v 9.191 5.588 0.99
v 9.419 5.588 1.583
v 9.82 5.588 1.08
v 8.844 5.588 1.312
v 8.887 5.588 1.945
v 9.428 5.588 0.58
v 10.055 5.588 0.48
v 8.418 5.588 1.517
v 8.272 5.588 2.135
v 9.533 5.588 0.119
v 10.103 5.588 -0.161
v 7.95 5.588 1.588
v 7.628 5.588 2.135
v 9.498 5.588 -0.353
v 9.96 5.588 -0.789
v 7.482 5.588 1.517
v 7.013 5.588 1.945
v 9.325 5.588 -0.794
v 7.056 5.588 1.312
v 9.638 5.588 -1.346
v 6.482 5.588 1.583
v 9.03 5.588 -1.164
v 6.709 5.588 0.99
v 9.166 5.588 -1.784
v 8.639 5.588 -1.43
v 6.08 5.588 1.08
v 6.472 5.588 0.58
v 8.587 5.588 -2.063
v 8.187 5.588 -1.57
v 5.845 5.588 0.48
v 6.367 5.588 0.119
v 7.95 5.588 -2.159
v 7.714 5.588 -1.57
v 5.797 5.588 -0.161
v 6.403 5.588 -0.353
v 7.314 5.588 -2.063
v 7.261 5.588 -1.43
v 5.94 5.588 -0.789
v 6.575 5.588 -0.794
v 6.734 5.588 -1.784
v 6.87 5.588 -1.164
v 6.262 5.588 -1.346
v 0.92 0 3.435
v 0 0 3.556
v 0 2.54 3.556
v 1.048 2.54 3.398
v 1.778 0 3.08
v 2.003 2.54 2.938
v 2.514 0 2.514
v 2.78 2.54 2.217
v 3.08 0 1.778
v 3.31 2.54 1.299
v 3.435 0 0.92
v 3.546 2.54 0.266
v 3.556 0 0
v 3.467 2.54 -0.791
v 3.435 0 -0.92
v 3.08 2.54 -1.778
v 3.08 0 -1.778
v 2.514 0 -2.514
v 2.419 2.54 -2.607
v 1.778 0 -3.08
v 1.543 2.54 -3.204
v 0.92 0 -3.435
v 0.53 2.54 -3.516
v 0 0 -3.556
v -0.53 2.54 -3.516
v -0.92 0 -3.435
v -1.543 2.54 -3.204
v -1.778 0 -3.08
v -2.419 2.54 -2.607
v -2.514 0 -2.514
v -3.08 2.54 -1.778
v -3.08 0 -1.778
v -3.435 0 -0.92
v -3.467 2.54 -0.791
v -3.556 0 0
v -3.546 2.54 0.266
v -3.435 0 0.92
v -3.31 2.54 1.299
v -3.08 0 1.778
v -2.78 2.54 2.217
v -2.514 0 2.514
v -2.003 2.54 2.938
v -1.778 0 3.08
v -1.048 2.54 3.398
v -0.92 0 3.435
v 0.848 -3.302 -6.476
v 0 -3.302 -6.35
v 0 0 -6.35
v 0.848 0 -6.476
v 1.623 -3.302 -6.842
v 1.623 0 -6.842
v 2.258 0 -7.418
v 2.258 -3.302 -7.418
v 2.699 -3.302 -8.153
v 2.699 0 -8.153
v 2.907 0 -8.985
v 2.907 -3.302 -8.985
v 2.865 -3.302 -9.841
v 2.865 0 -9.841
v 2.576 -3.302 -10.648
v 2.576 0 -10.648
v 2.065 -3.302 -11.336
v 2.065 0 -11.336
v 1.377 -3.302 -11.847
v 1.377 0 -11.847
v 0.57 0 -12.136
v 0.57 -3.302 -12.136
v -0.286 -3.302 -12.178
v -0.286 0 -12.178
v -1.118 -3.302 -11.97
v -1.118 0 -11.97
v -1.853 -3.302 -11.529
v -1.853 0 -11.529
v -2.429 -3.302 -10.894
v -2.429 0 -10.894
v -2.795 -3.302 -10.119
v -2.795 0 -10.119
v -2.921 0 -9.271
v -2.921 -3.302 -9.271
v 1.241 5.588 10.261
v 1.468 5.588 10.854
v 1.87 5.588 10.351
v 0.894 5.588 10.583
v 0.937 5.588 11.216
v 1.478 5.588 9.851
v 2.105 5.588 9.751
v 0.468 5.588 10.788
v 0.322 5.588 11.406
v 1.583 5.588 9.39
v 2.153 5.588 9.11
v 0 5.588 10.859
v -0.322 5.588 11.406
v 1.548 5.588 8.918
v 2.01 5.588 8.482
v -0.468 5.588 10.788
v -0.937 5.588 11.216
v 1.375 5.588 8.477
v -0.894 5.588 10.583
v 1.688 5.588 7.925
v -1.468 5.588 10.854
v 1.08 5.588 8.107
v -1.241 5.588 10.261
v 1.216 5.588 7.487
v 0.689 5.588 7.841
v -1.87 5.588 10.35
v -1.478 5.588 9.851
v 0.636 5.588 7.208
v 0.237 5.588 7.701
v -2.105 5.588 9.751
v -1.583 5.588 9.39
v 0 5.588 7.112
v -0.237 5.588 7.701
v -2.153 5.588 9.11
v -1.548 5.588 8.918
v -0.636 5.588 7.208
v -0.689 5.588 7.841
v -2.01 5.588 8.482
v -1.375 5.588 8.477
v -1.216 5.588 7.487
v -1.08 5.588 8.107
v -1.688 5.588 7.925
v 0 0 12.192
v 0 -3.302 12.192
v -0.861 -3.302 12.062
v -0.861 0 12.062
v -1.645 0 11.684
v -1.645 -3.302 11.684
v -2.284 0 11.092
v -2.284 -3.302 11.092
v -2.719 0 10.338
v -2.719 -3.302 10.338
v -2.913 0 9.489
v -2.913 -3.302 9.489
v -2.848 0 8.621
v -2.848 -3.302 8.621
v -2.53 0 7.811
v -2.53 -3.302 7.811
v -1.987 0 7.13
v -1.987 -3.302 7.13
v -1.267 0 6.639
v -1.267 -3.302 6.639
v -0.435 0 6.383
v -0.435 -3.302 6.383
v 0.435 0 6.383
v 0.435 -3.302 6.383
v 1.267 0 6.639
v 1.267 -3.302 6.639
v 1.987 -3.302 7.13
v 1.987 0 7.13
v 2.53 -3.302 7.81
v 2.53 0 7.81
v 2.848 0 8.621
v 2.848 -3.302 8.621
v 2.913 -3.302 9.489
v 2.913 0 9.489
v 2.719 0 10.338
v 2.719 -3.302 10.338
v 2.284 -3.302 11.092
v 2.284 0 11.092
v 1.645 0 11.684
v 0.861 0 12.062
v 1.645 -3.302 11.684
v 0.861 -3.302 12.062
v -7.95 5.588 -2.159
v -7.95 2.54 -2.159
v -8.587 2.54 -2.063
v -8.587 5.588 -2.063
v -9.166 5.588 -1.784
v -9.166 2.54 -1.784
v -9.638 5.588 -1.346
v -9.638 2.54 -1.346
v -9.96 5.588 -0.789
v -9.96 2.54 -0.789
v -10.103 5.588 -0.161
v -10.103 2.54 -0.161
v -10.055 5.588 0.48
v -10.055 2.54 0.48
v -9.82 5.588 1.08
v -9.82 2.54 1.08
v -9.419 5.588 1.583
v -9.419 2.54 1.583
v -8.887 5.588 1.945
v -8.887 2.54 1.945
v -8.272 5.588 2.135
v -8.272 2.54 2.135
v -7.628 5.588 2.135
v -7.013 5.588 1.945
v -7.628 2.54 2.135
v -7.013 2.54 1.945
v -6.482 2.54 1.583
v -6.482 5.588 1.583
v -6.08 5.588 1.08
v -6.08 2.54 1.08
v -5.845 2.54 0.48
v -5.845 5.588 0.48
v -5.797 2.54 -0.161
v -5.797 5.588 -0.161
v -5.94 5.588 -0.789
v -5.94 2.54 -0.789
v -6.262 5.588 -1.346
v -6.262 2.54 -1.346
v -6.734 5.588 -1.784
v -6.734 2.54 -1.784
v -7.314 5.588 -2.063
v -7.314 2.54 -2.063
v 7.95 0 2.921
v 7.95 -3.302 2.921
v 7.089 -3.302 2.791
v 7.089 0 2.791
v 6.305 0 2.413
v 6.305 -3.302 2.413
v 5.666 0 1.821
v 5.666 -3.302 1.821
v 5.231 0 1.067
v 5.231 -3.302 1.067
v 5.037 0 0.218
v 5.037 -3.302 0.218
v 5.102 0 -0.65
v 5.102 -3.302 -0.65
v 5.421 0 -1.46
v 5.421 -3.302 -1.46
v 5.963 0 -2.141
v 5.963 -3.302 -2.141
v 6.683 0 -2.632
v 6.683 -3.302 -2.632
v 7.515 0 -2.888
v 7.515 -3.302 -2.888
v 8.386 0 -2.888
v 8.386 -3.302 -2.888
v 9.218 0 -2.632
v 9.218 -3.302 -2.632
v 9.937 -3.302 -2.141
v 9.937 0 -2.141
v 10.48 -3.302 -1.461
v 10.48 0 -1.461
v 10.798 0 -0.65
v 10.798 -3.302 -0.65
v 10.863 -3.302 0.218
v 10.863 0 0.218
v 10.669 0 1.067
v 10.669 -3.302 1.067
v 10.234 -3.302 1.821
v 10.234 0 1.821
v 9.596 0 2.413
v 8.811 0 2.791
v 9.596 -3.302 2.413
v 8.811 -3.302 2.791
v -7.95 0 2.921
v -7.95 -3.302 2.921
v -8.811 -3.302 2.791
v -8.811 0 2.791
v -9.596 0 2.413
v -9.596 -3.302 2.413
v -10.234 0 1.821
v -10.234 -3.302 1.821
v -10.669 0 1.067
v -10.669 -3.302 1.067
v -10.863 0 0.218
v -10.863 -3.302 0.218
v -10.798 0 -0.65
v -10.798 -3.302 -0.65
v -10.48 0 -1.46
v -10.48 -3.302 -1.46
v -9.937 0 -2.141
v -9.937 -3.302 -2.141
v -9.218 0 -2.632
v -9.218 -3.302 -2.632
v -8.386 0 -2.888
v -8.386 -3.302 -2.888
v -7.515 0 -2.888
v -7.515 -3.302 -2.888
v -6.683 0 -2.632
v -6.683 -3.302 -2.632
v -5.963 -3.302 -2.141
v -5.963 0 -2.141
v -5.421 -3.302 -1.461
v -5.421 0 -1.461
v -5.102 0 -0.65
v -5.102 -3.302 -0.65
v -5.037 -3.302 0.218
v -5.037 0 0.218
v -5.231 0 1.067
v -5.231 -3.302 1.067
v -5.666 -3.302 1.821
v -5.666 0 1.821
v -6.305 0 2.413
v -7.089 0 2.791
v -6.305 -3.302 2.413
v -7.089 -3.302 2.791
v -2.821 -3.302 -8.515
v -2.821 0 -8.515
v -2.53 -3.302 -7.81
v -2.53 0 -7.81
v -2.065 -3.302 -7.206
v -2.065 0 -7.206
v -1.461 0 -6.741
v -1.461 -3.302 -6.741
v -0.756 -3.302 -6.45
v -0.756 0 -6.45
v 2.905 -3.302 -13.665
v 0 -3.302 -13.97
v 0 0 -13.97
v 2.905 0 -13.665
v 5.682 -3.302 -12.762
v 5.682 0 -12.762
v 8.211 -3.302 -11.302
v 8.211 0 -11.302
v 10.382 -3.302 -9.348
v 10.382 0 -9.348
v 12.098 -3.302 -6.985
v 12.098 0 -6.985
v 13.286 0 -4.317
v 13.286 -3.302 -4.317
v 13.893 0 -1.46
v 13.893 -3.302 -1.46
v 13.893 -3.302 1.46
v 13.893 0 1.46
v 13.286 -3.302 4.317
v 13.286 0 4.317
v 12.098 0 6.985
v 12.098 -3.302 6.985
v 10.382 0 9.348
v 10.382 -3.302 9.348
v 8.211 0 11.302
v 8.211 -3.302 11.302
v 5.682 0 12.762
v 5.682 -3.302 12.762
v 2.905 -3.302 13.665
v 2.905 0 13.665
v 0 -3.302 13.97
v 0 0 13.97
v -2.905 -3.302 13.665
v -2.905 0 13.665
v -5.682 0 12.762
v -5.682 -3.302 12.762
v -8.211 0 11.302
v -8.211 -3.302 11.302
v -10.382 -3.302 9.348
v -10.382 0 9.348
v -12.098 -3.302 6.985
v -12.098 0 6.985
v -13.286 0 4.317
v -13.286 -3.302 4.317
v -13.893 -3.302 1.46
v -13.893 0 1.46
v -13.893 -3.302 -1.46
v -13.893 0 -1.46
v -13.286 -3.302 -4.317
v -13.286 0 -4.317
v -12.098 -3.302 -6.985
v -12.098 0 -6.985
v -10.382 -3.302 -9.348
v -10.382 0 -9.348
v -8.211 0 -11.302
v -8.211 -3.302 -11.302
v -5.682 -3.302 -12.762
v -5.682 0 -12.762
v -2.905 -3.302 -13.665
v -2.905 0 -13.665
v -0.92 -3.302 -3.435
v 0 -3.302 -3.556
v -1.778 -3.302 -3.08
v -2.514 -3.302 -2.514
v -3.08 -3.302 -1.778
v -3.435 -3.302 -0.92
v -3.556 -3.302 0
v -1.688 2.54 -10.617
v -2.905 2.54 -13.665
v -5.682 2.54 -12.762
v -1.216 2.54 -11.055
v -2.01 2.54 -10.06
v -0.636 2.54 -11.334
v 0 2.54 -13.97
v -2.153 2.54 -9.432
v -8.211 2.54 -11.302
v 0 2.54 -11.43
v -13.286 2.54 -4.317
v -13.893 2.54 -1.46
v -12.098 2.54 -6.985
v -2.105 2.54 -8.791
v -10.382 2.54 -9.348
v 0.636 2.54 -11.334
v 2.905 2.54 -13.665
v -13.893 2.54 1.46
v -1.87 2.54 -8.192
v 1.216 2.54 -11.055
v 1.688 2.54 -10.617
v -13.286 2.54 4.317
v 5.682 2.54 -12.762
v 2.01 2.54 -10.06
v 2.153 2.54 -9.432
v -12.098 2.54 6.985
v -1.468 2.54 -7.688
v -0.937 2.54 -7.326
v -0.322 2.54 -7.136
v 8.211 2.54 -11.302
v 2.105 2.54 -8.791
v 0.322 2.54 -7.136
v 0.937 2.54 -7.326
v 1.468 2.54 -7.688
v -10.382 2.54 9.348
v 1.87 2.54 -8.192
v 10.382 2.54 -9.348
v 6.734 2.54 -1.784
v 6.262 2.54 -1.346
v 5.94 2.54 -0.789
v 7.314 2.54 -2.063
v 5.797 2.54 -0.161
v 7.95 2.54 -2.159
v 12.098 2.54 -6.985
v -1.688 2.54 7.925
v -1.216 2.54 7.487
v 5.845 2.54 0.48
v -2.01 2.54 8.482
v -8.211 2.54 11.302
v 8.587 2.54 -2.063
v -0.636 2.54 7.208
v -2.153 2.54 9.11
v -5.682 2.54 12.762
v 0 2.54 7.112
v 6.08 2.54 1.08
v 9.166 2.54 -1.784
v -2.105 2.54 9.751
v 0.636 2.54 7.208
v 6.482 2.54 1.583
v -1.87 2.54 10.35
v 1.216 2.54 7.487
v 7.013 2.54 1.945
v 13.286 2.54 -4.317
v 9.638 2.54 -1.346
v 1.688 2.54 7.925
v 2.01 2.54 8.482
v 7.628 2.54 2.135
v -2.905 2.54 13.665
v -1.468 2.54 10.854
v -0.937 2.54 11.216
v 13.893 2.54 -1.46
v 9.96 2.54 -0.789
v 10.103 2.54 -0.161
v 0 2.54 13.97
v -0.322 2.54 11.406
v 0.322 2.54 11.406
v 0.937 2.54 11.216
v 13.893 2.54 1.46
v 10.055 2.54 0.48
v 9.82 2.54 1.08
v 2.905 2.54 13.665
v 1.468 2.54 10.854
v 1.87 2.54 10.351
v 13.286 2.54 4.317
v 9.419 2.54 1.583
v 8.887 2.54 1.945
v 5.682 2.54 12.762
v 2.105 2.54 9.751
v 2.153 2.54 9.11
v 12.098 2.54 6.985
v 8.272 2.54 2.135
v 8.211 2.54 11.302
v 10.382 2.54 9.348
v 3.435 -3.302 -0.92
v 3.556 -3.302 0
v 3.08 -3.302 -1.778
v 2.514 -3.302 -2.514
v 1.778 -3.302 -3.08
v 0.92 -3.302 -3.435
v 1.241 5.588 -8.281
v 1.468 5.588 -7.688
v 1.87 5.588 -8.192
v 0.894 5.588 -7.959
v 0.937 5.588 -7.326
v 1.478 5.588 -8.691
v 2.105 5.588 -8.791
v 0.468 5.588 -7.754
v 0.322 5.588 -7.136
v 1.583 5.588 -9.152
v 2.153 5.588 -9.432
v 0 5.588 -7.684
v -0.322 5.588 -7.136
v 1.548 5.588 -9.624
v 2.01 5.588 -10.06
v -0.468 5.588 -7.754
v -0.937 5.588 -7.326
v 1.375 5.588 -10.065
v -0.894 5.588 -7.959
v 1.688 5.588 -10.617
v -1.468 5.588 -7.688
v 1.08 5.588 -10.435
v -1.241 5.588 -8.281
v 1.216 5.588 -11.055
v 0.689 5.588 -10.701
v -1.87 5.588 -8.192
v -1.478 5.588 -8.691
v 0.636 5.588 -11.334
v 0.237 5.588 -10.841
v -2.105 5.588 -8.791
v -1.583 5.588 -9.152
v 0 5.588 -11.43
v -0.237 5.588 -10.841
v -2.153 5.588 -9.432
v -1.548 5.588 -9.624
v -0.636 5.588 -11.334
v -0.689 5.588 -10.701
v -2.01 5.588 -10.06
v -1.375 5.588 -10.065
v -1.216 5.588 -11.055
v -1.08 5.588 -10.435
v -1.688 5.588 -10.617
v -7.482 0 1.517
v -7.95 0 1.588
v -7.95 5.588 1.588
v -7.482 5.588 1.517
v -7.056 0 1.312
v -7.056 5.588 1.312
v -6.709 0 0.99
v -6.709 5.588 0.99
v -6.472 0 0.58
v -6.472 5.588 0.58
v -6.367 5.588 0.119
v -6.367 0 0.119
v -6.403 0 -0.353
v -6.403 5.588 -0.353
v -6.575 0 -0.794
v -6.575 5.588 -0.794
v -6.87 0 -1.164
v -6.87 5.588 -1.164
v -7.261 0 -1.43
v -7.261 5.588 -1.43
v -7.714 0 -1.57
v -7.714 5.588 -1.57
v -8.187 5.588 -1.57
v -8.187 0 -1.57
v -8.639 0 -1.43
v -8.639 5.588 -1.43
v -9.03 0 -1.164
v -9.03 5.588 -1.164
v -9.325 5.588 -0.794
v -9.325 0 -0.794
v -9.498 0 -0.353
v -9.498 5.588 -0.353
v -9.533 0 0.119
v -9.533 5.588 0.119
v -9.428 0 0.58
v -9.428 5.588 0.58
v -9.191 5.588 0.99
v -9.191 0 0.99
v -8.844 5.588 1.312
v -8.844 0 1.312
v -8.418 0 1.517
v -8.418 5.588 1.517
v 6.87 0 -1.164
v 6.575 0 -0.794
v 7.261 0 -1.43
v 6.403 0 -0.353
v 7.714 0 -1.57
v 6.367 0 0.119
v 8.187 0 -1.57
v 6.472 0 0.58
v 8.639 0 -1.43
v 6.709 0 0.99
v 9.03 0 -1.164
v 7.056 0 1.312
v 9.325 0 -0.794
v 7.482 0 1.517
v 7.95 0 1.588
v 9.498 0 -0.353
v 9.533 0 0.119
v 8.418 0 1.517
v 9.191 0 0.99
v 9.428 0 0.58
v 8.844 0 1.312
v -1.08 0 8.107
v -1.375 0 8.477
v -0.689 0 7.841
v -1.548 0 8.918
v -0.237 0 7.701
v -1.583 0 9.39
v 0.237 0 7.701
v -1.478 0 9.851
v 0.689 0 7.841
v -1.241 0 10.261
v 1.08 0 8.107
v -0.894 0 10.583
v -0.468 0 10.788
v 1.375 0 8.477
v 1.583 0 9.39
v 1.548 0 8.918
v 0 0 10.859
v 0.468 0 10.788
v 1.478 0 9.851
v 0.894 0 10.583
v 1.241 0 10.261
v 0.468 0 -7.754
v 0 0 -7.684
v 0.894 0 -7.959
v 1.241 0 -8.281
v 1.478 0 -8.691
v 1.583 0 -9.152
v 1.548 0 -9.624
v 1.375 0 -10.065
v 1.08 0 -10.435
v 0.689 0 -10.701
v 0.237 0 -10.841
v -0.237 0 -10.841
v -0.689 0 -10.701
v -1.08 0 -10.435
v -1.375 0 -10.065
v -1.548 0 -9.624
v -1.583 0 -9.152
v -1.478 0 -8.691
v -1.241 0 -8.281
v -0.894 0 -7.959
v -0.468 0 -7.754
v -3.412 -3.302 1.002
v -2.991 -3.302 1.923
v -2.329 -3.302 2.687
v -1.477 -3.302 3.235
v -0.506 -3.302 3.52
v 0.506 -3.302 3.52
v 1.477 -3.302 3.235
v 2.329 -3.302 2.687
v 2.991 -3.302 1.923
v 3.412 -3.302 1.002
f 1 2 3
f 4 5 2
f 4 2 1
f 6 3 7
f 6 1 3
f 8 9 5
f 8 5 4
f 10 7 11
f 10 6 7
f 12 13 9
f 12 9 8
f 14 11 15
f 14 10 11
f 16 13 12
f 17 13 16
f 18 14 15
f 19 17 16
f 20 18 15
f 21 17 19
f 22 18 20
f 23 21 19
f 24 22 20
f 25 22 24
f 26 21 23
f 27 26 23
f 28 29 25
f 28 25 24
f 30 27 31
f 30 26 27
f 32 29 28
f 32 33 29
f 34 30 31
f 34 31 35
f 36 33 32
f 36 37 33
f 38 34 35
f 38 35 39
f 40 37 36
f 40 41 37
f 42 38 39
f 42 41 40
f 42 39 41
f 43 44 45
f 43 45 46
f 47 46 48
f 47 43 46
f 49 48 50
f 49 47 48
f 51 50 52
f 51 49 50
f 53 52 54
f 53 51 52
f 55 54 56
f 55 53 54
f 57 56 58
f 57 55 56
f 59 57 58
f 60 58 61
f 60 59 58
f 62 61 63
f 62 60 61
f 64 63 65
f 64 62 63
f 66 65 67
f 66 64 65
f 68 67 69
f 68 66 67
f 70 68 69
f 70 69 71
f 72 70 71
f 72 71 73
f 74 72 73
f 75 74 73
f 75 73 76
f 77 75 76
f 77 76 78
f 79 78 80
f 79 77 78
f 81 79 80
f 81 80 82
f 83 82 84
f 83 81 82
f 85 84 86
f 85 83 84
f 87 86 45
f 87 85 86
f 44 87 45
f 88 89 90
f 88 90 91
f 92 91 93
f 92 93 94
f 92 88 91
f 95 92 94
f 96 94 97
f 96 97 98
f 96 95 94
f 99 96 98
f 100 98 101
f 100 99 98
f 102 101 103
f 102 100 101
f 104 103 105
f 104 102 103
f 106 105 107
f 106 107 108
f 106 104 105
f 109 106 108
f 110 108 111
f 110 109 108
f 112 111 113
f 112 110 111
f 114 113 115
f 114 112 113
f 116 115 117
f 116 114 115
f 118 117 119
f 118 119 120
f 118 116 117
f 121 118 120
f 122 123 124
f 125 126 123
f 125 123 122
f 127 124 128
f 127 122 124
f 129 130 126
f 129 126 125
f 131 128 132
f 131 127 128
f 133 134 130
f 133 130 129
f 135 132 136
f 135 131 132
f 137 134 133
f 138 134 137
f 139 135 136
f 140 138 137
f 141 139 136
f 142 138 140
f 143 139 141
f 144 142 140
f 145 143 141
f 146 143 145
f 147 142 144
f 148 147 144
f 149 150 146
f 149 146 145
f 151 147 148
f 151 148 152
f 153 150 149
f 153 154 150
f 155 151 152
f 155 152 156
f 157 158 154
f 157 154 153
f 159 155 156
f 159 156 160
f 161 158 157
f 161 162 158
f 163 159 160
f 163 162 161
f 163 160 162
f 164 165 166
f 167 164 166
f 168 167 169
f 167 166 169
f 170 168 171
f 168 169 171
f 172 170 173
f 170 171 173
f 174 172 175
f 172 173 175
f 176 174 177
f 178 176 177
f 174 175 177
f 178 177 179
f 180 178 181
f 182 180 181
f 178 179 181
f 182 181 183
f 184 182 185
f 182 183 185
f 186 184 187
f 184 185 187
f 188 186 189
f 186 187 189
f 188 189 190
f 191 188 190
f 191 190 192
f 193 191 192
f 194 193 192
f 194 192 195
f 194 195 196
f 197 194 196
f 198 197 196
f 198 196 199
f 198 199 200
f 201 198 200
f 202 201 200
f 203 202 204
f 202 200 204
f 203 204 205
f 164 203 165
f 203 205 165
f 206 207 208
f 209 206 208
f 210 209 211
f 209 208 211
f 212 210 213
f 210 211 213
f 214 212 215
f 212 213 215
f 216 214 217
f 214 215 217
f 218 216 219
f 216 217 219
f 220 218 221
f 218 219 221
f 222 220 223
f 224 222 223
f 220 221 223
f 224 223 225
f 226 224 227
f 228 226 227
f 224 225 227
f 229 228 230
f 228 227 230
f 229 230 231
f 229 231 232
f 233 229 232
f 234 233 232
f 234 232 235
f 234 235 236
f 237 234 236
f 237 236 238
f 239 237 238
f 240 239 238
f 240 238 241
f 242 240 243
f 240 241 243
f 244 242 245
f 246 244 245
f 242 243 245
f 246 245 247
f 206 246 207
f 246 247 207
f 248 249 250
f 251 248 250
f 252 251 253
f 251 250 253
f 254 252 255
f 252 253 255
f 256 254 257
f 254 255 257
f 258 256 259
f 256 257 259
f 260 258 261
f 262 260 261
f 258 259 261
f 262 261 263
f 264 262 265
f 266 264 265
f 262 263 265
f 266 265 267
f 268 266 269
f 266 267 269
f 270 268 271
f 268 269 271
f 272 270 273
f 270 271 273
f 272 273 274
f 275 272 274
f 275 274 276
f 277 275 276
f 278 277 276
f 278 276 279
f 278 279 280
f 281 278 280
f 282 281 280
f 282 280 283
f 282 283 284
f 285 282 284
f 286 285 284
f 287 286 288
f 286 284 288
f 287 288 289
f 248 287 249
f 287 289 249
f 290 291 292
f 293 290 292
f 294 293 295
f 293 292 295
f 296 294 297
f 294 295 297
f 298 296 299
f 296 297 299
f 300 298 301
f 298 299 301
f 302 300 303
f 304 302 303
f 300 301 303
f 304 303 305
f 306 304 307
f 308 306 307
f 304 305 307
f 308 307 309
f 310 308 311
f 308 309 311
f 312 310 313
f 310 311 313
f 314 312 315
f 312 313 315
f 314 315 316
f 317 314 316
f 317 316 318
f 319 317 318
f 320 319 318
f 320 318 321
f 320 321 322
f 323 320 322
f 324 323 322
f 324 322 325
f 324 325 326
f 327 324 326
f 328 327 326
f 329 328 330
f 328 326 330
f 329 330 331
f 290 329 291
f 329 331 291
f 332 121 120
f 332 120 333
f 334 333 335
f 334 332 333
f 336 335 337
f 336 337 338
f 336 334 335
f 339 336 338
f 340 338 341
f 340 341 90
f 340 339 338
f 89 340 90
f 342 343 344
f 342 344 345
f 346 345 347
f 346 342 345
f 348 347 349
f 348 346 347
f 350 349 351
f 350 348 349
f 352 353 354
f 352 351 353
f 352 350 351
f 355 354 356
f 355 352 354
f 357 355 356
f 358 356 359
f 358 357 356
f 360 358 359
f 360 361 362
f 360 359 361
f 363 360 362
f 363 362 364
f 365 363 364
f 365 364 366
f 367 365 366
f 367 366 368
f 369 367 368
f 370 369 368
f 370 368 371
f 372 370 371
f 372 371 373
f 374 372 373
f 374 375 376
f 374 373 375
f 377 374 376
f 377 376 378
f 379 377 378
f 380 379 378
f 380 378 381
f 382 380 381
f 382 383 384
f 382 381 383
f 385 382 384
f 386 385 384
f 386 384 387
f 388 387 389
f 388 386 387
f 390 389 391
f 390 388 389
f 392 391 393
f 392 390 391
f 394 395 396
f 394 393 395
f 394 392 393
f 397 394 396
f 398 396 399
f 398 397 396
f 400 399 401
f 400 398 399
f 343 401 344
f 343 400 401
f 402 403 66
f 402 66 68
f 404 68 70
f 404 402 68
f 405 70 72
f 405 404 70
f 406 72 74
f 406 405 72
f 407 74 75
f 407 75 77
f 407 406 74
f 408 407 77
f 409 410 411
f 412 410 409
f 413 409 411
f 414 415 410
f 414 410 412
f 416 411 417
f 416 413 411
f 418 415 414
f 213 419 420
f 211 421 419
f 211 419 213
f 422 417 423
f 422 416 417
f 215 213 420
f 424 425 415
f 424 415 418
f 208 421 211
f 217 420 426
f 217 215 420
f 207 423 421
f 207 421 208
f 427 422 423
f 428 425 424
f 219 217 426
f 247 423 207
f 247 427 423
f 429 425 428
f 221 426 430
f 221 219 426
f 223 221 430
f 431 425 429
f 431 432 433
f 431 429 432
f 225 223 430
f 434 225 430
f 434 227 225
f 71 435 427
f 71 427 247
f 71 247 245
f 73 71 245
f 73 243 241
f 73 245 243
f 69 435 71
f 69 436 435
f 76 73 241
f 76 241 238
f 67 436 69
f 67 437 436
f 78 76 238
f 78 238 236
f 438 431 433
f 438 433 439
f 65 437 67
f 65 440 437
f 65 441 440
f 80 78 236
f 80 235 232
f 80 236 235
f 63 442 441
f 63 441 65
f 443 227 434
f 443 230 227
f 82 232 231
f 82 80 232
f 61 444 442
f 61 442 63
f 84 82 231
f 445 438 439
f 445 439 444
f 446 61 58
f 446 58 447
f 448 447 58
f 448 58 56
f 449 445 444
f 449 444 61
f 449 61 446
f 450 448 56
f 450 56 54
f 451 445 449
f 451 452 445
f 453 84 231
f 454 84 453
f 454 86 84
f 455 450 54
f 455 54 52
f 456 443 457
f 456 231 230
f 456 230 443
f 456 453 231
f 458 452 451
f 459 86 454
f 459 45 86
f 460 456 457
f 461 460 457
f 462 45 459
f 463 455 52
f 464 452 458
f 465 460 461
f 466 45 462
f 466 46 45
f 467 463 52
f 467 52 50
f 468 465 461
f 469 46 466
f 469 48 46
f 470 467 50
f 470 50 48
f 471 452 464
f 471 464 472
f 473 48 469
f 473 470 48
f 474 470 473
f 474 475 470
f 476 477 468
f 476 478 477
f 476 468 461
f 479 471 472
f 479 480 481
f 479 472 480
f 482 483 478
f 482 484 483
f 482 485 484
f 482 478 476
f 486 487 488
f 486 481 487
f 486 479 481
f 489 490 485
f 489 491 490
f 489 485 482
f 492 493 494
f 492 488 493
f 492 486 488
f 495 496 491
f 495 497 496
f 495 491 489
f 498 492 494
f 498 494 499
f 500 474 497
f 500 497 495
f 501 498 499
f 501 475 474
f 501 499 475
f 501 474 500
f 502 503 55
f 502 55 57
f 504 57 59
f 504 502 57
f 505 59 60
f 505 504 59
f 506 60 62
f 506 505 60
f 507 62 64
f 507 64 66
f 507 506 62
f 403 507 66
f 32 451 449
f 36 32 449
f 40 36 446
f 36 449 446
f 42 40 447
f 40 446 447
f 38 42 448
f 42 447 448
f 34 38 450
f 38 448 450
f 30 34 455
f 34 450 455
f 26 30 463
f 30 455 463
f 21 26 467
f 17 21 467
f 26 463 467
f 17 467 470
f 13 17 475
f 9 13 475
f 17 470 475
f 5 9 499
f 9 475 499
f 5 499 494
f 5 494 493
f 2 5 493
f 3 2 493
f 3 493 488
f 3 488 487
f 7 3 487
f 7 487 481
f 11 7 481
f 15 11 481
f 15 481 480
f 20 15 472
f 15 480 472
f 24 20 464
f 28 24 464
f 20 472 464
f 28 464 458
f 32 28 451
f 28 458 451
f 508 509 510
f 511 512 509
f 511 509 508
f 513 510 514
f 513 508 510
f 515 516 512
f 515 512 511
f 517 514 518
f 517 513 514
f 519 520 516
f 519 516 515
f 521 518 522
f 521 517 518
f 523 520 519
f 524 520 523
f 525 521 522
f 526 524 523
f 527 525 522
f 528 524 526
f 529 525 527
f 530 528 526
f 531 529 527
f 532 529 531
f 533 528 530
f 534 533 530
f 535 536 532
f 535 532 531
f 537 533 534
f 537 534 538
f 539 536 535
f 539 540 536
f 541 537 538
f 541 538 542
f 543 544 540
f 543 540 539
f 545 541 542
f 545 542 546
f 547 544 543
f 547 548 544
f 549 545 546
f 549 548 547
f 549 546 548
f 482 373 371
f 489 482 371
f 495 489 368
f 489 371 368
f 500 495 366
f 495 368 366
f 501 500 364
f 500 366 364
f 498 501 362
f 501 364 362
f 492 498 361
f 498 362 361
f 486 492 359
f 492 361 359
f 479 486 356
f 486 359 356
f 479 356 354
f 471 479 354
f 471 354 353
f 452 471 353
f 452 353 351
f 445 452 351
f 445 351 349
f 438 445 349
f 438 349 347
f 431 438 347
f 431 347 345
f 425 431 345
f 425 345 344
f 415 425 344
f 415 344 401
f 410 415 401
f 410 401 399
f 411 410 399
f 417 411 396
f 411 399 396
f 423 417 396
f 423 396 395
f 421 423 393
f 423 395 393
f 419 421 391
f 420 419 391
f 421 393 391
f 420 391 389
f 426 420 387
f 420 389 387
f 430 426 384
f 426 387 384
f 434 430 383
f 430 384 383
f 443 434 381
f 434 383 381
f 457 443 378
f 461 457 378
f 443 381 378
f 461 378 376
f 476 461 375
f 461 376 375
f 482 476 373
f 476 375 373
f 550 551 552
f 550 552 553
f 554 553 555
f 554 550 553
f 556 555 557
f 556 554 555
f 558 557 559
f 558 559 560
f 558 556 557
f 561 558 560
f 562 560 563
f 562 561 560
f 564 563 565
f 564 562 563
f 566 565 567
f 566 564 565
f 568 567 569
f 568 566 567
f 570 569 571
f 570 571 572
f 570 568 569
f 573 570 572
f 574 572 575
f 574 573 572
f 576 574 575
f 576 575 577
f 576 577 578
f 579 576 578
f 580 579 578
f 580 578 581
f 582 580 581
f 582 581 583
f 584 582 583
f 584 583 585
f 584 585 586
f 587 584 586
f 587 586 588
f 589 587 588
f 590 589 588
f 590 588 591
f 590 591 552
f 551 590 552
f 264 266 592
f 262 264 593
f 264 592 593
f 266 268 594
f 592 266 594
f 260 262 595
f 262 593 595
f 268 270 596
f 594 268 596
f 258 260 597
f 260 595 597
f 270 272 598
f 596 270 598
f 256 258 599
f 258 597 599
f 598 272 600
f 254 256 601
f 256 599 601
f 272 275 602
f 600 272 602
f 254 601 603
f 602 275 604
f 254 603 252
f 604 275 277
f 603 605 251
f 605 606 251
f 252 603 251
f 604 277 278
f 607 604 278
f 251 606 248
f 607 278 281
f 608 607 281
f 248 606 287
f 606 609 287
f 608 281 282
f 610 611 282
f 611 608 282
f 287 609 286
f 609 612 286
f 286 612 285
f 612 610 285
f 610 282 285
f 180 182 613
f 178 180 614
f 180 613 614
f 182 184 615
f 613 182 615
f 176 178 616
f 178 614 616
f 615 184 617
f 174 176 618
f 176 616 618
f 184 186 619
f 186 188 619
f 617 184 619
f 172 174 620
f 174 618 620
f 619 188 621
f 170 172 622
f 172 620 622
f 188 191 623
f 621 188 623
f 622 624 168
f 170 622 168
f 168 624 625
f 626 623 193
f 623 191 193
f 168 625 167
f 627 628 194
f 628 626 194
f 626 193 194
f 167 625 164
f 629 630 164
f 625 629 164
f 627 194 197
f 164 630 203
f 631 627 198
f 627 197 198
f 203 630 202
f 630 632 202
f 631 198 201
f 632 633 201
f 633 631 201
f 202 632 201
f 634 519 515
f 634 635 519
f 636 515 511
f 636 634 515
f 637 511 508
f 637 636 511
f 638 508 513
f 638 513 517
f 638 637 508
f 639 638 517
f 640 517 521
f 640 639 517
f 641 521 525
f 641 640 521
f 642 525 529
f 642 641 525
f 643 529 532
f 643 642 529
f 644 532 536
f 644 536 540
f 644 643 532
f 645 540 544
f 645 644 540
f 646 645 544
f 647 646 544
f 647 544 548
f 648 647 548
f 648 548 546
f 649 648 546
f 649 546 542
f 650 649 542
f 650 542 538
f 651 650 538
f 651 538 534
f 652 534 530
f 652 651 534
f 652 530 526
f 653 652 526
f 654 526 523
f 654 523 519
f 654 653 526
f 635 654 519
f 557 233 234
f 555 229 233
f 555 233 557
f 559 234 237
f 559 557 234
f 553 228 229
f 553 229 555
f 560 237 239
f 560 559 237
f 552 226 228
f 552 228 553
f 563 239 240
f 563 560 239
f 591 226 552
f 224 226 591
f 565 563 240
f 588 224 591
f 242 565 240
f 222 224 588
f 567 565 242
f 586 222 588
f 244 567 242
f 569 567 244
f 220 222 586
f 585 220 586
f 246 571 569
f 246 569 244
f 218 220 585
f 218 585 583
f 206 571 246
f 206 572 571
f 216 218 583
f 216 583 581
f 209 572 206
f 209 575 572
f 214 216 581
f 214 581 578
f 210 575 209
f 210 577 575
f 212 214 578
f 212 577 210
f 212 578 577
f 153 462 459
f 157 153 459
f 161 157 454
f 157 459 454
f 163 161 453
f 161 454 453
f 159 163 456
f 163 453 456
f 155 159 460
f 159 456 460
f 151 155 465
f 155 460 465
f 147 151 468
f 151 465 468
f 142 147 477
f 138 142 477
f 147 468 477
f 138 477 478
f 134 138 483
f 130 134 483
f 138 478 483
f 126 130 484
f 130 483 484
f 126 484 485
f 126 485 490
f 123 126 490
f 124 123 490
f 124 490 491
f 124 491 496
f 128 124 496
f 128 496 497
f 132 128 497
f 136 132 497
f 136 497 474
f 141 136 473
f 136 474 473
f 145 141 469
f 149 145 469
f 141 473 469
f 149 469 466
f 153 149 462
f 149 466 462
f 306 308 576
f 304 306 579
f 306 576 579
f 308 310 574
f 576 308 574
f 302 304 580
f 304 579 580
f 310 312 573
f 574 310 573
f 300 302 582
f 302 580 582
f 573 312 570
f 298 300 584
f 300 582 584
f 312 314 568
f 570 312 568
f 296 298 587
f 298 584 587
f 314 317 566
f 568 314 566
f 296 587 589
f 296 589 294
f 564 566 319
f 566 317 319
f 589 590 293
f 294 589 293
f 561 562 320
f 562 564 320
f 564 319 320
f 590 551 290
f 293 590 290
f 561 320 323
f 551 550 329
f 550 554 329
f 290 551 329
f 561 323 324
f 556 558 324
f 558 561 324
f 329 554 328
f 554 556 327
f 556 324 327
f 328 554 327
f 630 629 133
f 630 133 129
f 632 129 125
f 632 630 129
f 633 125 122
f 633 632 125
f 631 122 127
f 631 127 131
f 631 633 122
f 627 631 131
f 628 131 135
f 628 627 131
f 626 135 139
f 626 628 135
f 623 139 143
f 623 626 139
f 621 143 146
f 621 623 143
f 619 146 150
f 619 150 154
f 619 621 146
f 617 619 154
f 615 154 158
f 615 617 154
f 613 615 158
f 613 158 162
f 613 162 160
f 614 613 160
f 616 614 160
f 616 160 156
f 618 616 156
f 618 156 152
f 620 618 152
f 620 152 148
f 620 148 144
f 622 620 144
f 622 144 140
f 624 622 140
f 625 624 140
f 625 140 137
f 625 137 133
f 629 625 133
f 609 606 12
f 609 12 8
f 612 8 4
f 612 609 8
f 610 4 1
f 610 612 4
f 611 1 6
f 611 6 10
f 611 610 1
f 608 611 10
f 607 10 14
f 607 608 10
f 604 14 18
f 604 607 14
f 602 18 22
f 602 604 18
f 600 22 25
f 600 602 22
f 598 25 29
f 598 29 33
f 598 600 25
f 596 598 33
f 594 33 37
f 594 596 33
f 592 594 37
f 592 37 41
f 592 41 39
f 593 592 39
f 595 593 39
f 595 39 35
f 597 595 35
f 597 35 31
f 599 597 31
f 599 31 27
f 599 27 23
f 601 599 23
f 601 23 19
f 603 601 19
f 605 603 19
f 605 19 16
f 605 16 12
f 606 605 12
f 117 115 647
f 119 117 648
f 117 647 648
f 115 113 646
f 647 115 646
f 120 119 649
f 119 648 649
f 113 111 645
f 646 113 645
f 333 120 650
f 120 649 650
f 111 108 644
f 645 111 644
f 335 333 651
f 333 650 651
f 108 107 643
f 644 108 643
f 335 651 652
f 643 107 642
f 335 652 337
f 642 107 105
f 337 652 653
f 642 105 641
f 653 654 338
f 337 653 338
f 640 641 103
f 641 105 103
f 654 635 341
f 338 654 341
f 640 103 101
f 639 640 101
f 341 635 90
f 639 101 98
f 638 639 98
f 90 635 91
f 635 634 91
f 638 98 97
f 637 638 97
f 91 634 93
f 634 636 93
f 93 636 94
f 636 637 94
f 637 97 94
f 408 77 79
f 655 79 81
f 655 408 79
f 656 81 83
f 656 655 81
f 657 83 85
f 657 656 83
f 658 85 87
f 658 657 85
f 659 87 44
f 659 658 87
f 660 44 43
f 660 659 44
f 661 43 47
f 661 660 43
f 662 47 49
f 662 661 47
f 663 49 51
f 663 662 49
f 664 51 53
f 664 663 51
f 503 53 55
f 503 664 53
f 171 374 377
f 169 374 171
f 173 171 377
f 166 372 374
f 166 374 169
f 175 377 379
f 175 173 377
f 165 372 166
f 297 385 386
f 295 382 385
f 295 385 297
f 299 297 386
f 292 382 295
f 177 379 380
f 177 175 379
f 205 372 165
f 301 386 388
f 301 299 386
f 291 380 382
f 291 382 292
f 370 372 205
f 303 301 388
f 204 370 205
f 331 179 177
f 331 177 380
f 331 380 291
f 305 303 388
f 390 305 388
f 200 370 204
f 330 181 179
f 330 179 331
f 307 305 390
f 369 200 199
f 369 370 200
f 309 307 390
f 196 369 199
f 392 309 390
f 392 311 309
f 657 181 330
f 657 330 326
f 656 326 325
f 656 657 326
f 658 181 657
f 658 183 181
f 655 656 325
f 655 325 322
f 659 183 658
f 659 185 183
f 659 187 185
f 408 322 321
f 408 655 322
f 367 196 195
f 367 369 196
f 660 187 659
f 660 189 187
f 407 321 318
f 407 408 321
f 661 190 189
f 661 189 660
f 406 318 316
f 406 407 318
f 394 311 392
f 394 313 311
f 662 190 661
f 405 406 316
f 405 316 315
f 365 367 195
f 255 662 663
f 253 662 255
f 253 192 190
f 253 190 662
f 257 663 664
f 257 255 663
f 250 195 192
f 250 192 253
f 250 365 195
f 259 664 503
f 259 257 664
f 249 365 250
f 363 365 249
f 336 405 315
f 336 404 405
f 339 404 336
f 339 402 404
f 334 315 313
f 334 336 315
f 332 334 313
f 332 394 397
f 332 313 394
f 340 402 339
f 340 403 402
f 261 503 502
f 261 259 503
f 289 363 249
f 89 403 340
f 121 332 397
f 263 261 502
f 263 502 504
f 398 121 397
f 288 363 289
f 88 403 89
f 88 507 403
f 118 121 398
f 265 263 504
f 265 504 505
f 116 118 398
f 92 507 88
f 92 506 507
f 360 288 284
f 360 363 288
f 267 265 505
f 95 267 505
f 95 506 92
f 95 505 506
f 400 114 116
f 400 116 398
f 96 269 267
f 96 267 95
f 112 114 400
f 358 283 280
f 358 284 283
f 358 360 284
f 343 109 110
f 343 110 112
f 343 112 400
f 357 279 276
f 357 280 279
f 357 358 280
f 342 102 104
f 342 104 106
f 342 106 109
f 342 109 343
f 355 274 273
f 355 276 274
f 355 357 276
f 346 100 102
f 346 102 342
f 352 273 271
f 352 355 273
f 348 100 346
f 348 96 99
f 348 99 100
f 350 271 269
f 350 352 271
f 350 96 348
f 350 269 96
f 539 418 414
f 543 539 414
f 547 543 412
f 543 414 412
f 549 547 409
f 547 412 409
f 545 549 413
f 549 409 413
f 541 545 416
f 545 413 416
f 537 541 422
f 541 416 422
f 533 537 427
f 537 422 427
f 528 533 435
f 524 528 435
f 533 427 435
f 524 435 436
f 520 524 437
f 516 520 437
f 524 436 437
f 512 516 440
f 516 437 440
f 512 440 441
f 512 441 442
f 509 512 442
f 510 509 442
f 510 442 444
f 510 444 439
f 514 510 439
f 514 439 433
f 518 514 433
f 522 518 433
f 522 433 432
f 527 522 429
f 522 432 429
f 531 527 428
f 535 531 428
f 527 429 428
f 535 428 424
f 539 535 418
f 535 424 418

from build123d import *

# Parameters (mm, degrees)
SKETCH1_R           = 13.97
SKETCH1_R_2         = 3.556
SKETCH1_R_3         = 1.5875
BOSS_EXTRUDE4_DEPTH = 2.54
SKETCH2_R           = 2.159
SKETCH2_R_2         = 1.5875
BOSS_EXTRUDE6_DEPTH = 3.048
BOSS_EXTRUDE7_START = 3.302
SKETCH3_R           = 13.97
SKETCH3_R_2         = 2.921
BOSS_EXTRUDE7_DEPTH = 3.302


with BuildPart() as part:
    # Sketch1 → Boss-Extrude4 (new body)
    with BuildSketch(Plane(origin=(0, 0, 0), x_dir=(1, 0, 0), z_dir=(0, 1, 0))):
        with Locations(Location((0, 0, 0), (0, 0, 270))):
            Circle(SKETCH1_R)
        with Locations(Location((0, 0, 0), (0, 0, 270))):
            Circle(SKETCH1_R_2, mode=Mode.SUBTRACT)
        with Locations(Location((-7.9502, 0, 0), (0, 0, 270))):
            Circle(SKETCH1_R_3, mode=Mode.SUBTRACT)
        with Locations(Location((7.9502, 0, 0), (0, 0, 270))):
            Circle(SKETCH1_R_3, mode=Mode.SUBTRACT)
        with Locations(Location((0, 9.271, 0), (0, 0, 270))):
            Circle(SKETCH1_R_3, mode=Mode.SUBTRACT)
        with Locations(Location((0, -9.271, 0), (0, 0, 270))):
            Circle(SKETCH1_R_3, mode=Mode.SUBTRACT)
    extrude(amount=BOSS_EXTRUDE4_DEPTH)

    # Sketch2 → Boss-Extrude6 (add)
    # profile 1 of 4: a face of its own
    with BuildSketch(Plane(origin=(0, 2.54, 0), x_dir=(1, 0, 0), z_dir=(0, 1, 0))):
        with Locations(Location((0, 9.271, 0), (0, 0, 90))):
            Circle(SKETCH2_R)
        with Locations(Location((0, 9.271, 0), (0, 0, 270))):
            Circle(SKETCH2_R_2, mode=Mode.SUBTRACT)
    # profile 2 of 4: a face of its own
    with BuildSketch(Plane(origin=(0, 2.54, 0), x_dir=(1, 0, 0), z_dir=(0, 1, 0))):
        with Locations(Location((7.9502, 0, 0), (0, 0, 90))):
            Circle(SKETCH2_R)
        with Locations(Location((7.9502, 0, 0), (0, 0, 270))):
            Circle(SKETCH2_R_2, mode=Mode.SUBTRACT)
    # profile 3 of 4: a face of its own
    with BuildSketch(Plane(origin=(0, 2.54, 0), x_dir=(1, 0, 0), z_dir=(0, 1, 0))):
        with Locations(Location((-7.9502, 0, 0), (0, 0, 90))):
            Circle(SKETCH2_R)
        with Locations(Location((-7.9502, 0, 0), (0, 0, 270))):
            Circle(SKETCH2_R_2, mode=Mode.SUBTRACT)
    # profile 4 of 4: a face of its own
    with BuildSketch(Plane(origin=(0, 2.54, 0), x_dir=(1, 0, 0), z_dir=(0, 1, 0))):
        with Locations(Location((0, -9.271, 0), (0, 0, 90))):
            Circle(SKETCH2_R)
        with Locations(Location((0, -9.271, 0), (0, 0, 270))):
            Circle(SKETCH2_R_2, mode=Mode.SUBTRACT)
    extrude(amount=BOSS_EXTRUDE6_DEPTH)

    # Sketch3 → Boss-Extrude7 (add)
    with BuildSketch(Plane(origin=(0, 0, 0), x_dir=(-1, 0, 0), z_dir=(0, -1, 0)).offset(BOSS_EXTRUDE7_START)):
        with Locations(Location((0, 0, 0), (0, 0, 90))):
            Circle(SKETCH3_R)
        with Locations(Location((0, -9.271, 0), (0, 0, 270))):
            Circle(SKETCH3_R_2, mode=Mode.SUBTRACT)
        with Locations(Location((-7.9502, 0, 0), (0, 0, 270))):
            Circle(SKETCH3_R_2, mode=Mode.SUBTRACT)
        with BuildLine():
            ThreePointArc((-3.556, 0), (-2.514471714, 2.514471714), (0, 3.556))
            ThreePointArc((0, 3.556), (2.514471714, 2.514471714), (3.556, 0))
            ThreePointArc((3.556, 0), (0, -3.556), (-3.556, 0))
        make_face(mode=Mode.SUBTRACT)
        with Locations(Location((7.9502, 0, 0), (0, 0, 270))):
            Circle(SKETCH3_R_2, mode=Mode.SUBTRACT)
        with BuildLine():
            ThreePointArc((2.921, 9.271), (2.065458908, 7.205541092), (0, 6.35))
            ThreePointArc((0, 6.35), (-2.065458908, 11.336458908), (2.921, 9.271))
        make_face(mode=Mode.SUBTRACT)
    extrude(amount=-BOSS_EXTRUDE7_DEPTH)


solid = part.part
